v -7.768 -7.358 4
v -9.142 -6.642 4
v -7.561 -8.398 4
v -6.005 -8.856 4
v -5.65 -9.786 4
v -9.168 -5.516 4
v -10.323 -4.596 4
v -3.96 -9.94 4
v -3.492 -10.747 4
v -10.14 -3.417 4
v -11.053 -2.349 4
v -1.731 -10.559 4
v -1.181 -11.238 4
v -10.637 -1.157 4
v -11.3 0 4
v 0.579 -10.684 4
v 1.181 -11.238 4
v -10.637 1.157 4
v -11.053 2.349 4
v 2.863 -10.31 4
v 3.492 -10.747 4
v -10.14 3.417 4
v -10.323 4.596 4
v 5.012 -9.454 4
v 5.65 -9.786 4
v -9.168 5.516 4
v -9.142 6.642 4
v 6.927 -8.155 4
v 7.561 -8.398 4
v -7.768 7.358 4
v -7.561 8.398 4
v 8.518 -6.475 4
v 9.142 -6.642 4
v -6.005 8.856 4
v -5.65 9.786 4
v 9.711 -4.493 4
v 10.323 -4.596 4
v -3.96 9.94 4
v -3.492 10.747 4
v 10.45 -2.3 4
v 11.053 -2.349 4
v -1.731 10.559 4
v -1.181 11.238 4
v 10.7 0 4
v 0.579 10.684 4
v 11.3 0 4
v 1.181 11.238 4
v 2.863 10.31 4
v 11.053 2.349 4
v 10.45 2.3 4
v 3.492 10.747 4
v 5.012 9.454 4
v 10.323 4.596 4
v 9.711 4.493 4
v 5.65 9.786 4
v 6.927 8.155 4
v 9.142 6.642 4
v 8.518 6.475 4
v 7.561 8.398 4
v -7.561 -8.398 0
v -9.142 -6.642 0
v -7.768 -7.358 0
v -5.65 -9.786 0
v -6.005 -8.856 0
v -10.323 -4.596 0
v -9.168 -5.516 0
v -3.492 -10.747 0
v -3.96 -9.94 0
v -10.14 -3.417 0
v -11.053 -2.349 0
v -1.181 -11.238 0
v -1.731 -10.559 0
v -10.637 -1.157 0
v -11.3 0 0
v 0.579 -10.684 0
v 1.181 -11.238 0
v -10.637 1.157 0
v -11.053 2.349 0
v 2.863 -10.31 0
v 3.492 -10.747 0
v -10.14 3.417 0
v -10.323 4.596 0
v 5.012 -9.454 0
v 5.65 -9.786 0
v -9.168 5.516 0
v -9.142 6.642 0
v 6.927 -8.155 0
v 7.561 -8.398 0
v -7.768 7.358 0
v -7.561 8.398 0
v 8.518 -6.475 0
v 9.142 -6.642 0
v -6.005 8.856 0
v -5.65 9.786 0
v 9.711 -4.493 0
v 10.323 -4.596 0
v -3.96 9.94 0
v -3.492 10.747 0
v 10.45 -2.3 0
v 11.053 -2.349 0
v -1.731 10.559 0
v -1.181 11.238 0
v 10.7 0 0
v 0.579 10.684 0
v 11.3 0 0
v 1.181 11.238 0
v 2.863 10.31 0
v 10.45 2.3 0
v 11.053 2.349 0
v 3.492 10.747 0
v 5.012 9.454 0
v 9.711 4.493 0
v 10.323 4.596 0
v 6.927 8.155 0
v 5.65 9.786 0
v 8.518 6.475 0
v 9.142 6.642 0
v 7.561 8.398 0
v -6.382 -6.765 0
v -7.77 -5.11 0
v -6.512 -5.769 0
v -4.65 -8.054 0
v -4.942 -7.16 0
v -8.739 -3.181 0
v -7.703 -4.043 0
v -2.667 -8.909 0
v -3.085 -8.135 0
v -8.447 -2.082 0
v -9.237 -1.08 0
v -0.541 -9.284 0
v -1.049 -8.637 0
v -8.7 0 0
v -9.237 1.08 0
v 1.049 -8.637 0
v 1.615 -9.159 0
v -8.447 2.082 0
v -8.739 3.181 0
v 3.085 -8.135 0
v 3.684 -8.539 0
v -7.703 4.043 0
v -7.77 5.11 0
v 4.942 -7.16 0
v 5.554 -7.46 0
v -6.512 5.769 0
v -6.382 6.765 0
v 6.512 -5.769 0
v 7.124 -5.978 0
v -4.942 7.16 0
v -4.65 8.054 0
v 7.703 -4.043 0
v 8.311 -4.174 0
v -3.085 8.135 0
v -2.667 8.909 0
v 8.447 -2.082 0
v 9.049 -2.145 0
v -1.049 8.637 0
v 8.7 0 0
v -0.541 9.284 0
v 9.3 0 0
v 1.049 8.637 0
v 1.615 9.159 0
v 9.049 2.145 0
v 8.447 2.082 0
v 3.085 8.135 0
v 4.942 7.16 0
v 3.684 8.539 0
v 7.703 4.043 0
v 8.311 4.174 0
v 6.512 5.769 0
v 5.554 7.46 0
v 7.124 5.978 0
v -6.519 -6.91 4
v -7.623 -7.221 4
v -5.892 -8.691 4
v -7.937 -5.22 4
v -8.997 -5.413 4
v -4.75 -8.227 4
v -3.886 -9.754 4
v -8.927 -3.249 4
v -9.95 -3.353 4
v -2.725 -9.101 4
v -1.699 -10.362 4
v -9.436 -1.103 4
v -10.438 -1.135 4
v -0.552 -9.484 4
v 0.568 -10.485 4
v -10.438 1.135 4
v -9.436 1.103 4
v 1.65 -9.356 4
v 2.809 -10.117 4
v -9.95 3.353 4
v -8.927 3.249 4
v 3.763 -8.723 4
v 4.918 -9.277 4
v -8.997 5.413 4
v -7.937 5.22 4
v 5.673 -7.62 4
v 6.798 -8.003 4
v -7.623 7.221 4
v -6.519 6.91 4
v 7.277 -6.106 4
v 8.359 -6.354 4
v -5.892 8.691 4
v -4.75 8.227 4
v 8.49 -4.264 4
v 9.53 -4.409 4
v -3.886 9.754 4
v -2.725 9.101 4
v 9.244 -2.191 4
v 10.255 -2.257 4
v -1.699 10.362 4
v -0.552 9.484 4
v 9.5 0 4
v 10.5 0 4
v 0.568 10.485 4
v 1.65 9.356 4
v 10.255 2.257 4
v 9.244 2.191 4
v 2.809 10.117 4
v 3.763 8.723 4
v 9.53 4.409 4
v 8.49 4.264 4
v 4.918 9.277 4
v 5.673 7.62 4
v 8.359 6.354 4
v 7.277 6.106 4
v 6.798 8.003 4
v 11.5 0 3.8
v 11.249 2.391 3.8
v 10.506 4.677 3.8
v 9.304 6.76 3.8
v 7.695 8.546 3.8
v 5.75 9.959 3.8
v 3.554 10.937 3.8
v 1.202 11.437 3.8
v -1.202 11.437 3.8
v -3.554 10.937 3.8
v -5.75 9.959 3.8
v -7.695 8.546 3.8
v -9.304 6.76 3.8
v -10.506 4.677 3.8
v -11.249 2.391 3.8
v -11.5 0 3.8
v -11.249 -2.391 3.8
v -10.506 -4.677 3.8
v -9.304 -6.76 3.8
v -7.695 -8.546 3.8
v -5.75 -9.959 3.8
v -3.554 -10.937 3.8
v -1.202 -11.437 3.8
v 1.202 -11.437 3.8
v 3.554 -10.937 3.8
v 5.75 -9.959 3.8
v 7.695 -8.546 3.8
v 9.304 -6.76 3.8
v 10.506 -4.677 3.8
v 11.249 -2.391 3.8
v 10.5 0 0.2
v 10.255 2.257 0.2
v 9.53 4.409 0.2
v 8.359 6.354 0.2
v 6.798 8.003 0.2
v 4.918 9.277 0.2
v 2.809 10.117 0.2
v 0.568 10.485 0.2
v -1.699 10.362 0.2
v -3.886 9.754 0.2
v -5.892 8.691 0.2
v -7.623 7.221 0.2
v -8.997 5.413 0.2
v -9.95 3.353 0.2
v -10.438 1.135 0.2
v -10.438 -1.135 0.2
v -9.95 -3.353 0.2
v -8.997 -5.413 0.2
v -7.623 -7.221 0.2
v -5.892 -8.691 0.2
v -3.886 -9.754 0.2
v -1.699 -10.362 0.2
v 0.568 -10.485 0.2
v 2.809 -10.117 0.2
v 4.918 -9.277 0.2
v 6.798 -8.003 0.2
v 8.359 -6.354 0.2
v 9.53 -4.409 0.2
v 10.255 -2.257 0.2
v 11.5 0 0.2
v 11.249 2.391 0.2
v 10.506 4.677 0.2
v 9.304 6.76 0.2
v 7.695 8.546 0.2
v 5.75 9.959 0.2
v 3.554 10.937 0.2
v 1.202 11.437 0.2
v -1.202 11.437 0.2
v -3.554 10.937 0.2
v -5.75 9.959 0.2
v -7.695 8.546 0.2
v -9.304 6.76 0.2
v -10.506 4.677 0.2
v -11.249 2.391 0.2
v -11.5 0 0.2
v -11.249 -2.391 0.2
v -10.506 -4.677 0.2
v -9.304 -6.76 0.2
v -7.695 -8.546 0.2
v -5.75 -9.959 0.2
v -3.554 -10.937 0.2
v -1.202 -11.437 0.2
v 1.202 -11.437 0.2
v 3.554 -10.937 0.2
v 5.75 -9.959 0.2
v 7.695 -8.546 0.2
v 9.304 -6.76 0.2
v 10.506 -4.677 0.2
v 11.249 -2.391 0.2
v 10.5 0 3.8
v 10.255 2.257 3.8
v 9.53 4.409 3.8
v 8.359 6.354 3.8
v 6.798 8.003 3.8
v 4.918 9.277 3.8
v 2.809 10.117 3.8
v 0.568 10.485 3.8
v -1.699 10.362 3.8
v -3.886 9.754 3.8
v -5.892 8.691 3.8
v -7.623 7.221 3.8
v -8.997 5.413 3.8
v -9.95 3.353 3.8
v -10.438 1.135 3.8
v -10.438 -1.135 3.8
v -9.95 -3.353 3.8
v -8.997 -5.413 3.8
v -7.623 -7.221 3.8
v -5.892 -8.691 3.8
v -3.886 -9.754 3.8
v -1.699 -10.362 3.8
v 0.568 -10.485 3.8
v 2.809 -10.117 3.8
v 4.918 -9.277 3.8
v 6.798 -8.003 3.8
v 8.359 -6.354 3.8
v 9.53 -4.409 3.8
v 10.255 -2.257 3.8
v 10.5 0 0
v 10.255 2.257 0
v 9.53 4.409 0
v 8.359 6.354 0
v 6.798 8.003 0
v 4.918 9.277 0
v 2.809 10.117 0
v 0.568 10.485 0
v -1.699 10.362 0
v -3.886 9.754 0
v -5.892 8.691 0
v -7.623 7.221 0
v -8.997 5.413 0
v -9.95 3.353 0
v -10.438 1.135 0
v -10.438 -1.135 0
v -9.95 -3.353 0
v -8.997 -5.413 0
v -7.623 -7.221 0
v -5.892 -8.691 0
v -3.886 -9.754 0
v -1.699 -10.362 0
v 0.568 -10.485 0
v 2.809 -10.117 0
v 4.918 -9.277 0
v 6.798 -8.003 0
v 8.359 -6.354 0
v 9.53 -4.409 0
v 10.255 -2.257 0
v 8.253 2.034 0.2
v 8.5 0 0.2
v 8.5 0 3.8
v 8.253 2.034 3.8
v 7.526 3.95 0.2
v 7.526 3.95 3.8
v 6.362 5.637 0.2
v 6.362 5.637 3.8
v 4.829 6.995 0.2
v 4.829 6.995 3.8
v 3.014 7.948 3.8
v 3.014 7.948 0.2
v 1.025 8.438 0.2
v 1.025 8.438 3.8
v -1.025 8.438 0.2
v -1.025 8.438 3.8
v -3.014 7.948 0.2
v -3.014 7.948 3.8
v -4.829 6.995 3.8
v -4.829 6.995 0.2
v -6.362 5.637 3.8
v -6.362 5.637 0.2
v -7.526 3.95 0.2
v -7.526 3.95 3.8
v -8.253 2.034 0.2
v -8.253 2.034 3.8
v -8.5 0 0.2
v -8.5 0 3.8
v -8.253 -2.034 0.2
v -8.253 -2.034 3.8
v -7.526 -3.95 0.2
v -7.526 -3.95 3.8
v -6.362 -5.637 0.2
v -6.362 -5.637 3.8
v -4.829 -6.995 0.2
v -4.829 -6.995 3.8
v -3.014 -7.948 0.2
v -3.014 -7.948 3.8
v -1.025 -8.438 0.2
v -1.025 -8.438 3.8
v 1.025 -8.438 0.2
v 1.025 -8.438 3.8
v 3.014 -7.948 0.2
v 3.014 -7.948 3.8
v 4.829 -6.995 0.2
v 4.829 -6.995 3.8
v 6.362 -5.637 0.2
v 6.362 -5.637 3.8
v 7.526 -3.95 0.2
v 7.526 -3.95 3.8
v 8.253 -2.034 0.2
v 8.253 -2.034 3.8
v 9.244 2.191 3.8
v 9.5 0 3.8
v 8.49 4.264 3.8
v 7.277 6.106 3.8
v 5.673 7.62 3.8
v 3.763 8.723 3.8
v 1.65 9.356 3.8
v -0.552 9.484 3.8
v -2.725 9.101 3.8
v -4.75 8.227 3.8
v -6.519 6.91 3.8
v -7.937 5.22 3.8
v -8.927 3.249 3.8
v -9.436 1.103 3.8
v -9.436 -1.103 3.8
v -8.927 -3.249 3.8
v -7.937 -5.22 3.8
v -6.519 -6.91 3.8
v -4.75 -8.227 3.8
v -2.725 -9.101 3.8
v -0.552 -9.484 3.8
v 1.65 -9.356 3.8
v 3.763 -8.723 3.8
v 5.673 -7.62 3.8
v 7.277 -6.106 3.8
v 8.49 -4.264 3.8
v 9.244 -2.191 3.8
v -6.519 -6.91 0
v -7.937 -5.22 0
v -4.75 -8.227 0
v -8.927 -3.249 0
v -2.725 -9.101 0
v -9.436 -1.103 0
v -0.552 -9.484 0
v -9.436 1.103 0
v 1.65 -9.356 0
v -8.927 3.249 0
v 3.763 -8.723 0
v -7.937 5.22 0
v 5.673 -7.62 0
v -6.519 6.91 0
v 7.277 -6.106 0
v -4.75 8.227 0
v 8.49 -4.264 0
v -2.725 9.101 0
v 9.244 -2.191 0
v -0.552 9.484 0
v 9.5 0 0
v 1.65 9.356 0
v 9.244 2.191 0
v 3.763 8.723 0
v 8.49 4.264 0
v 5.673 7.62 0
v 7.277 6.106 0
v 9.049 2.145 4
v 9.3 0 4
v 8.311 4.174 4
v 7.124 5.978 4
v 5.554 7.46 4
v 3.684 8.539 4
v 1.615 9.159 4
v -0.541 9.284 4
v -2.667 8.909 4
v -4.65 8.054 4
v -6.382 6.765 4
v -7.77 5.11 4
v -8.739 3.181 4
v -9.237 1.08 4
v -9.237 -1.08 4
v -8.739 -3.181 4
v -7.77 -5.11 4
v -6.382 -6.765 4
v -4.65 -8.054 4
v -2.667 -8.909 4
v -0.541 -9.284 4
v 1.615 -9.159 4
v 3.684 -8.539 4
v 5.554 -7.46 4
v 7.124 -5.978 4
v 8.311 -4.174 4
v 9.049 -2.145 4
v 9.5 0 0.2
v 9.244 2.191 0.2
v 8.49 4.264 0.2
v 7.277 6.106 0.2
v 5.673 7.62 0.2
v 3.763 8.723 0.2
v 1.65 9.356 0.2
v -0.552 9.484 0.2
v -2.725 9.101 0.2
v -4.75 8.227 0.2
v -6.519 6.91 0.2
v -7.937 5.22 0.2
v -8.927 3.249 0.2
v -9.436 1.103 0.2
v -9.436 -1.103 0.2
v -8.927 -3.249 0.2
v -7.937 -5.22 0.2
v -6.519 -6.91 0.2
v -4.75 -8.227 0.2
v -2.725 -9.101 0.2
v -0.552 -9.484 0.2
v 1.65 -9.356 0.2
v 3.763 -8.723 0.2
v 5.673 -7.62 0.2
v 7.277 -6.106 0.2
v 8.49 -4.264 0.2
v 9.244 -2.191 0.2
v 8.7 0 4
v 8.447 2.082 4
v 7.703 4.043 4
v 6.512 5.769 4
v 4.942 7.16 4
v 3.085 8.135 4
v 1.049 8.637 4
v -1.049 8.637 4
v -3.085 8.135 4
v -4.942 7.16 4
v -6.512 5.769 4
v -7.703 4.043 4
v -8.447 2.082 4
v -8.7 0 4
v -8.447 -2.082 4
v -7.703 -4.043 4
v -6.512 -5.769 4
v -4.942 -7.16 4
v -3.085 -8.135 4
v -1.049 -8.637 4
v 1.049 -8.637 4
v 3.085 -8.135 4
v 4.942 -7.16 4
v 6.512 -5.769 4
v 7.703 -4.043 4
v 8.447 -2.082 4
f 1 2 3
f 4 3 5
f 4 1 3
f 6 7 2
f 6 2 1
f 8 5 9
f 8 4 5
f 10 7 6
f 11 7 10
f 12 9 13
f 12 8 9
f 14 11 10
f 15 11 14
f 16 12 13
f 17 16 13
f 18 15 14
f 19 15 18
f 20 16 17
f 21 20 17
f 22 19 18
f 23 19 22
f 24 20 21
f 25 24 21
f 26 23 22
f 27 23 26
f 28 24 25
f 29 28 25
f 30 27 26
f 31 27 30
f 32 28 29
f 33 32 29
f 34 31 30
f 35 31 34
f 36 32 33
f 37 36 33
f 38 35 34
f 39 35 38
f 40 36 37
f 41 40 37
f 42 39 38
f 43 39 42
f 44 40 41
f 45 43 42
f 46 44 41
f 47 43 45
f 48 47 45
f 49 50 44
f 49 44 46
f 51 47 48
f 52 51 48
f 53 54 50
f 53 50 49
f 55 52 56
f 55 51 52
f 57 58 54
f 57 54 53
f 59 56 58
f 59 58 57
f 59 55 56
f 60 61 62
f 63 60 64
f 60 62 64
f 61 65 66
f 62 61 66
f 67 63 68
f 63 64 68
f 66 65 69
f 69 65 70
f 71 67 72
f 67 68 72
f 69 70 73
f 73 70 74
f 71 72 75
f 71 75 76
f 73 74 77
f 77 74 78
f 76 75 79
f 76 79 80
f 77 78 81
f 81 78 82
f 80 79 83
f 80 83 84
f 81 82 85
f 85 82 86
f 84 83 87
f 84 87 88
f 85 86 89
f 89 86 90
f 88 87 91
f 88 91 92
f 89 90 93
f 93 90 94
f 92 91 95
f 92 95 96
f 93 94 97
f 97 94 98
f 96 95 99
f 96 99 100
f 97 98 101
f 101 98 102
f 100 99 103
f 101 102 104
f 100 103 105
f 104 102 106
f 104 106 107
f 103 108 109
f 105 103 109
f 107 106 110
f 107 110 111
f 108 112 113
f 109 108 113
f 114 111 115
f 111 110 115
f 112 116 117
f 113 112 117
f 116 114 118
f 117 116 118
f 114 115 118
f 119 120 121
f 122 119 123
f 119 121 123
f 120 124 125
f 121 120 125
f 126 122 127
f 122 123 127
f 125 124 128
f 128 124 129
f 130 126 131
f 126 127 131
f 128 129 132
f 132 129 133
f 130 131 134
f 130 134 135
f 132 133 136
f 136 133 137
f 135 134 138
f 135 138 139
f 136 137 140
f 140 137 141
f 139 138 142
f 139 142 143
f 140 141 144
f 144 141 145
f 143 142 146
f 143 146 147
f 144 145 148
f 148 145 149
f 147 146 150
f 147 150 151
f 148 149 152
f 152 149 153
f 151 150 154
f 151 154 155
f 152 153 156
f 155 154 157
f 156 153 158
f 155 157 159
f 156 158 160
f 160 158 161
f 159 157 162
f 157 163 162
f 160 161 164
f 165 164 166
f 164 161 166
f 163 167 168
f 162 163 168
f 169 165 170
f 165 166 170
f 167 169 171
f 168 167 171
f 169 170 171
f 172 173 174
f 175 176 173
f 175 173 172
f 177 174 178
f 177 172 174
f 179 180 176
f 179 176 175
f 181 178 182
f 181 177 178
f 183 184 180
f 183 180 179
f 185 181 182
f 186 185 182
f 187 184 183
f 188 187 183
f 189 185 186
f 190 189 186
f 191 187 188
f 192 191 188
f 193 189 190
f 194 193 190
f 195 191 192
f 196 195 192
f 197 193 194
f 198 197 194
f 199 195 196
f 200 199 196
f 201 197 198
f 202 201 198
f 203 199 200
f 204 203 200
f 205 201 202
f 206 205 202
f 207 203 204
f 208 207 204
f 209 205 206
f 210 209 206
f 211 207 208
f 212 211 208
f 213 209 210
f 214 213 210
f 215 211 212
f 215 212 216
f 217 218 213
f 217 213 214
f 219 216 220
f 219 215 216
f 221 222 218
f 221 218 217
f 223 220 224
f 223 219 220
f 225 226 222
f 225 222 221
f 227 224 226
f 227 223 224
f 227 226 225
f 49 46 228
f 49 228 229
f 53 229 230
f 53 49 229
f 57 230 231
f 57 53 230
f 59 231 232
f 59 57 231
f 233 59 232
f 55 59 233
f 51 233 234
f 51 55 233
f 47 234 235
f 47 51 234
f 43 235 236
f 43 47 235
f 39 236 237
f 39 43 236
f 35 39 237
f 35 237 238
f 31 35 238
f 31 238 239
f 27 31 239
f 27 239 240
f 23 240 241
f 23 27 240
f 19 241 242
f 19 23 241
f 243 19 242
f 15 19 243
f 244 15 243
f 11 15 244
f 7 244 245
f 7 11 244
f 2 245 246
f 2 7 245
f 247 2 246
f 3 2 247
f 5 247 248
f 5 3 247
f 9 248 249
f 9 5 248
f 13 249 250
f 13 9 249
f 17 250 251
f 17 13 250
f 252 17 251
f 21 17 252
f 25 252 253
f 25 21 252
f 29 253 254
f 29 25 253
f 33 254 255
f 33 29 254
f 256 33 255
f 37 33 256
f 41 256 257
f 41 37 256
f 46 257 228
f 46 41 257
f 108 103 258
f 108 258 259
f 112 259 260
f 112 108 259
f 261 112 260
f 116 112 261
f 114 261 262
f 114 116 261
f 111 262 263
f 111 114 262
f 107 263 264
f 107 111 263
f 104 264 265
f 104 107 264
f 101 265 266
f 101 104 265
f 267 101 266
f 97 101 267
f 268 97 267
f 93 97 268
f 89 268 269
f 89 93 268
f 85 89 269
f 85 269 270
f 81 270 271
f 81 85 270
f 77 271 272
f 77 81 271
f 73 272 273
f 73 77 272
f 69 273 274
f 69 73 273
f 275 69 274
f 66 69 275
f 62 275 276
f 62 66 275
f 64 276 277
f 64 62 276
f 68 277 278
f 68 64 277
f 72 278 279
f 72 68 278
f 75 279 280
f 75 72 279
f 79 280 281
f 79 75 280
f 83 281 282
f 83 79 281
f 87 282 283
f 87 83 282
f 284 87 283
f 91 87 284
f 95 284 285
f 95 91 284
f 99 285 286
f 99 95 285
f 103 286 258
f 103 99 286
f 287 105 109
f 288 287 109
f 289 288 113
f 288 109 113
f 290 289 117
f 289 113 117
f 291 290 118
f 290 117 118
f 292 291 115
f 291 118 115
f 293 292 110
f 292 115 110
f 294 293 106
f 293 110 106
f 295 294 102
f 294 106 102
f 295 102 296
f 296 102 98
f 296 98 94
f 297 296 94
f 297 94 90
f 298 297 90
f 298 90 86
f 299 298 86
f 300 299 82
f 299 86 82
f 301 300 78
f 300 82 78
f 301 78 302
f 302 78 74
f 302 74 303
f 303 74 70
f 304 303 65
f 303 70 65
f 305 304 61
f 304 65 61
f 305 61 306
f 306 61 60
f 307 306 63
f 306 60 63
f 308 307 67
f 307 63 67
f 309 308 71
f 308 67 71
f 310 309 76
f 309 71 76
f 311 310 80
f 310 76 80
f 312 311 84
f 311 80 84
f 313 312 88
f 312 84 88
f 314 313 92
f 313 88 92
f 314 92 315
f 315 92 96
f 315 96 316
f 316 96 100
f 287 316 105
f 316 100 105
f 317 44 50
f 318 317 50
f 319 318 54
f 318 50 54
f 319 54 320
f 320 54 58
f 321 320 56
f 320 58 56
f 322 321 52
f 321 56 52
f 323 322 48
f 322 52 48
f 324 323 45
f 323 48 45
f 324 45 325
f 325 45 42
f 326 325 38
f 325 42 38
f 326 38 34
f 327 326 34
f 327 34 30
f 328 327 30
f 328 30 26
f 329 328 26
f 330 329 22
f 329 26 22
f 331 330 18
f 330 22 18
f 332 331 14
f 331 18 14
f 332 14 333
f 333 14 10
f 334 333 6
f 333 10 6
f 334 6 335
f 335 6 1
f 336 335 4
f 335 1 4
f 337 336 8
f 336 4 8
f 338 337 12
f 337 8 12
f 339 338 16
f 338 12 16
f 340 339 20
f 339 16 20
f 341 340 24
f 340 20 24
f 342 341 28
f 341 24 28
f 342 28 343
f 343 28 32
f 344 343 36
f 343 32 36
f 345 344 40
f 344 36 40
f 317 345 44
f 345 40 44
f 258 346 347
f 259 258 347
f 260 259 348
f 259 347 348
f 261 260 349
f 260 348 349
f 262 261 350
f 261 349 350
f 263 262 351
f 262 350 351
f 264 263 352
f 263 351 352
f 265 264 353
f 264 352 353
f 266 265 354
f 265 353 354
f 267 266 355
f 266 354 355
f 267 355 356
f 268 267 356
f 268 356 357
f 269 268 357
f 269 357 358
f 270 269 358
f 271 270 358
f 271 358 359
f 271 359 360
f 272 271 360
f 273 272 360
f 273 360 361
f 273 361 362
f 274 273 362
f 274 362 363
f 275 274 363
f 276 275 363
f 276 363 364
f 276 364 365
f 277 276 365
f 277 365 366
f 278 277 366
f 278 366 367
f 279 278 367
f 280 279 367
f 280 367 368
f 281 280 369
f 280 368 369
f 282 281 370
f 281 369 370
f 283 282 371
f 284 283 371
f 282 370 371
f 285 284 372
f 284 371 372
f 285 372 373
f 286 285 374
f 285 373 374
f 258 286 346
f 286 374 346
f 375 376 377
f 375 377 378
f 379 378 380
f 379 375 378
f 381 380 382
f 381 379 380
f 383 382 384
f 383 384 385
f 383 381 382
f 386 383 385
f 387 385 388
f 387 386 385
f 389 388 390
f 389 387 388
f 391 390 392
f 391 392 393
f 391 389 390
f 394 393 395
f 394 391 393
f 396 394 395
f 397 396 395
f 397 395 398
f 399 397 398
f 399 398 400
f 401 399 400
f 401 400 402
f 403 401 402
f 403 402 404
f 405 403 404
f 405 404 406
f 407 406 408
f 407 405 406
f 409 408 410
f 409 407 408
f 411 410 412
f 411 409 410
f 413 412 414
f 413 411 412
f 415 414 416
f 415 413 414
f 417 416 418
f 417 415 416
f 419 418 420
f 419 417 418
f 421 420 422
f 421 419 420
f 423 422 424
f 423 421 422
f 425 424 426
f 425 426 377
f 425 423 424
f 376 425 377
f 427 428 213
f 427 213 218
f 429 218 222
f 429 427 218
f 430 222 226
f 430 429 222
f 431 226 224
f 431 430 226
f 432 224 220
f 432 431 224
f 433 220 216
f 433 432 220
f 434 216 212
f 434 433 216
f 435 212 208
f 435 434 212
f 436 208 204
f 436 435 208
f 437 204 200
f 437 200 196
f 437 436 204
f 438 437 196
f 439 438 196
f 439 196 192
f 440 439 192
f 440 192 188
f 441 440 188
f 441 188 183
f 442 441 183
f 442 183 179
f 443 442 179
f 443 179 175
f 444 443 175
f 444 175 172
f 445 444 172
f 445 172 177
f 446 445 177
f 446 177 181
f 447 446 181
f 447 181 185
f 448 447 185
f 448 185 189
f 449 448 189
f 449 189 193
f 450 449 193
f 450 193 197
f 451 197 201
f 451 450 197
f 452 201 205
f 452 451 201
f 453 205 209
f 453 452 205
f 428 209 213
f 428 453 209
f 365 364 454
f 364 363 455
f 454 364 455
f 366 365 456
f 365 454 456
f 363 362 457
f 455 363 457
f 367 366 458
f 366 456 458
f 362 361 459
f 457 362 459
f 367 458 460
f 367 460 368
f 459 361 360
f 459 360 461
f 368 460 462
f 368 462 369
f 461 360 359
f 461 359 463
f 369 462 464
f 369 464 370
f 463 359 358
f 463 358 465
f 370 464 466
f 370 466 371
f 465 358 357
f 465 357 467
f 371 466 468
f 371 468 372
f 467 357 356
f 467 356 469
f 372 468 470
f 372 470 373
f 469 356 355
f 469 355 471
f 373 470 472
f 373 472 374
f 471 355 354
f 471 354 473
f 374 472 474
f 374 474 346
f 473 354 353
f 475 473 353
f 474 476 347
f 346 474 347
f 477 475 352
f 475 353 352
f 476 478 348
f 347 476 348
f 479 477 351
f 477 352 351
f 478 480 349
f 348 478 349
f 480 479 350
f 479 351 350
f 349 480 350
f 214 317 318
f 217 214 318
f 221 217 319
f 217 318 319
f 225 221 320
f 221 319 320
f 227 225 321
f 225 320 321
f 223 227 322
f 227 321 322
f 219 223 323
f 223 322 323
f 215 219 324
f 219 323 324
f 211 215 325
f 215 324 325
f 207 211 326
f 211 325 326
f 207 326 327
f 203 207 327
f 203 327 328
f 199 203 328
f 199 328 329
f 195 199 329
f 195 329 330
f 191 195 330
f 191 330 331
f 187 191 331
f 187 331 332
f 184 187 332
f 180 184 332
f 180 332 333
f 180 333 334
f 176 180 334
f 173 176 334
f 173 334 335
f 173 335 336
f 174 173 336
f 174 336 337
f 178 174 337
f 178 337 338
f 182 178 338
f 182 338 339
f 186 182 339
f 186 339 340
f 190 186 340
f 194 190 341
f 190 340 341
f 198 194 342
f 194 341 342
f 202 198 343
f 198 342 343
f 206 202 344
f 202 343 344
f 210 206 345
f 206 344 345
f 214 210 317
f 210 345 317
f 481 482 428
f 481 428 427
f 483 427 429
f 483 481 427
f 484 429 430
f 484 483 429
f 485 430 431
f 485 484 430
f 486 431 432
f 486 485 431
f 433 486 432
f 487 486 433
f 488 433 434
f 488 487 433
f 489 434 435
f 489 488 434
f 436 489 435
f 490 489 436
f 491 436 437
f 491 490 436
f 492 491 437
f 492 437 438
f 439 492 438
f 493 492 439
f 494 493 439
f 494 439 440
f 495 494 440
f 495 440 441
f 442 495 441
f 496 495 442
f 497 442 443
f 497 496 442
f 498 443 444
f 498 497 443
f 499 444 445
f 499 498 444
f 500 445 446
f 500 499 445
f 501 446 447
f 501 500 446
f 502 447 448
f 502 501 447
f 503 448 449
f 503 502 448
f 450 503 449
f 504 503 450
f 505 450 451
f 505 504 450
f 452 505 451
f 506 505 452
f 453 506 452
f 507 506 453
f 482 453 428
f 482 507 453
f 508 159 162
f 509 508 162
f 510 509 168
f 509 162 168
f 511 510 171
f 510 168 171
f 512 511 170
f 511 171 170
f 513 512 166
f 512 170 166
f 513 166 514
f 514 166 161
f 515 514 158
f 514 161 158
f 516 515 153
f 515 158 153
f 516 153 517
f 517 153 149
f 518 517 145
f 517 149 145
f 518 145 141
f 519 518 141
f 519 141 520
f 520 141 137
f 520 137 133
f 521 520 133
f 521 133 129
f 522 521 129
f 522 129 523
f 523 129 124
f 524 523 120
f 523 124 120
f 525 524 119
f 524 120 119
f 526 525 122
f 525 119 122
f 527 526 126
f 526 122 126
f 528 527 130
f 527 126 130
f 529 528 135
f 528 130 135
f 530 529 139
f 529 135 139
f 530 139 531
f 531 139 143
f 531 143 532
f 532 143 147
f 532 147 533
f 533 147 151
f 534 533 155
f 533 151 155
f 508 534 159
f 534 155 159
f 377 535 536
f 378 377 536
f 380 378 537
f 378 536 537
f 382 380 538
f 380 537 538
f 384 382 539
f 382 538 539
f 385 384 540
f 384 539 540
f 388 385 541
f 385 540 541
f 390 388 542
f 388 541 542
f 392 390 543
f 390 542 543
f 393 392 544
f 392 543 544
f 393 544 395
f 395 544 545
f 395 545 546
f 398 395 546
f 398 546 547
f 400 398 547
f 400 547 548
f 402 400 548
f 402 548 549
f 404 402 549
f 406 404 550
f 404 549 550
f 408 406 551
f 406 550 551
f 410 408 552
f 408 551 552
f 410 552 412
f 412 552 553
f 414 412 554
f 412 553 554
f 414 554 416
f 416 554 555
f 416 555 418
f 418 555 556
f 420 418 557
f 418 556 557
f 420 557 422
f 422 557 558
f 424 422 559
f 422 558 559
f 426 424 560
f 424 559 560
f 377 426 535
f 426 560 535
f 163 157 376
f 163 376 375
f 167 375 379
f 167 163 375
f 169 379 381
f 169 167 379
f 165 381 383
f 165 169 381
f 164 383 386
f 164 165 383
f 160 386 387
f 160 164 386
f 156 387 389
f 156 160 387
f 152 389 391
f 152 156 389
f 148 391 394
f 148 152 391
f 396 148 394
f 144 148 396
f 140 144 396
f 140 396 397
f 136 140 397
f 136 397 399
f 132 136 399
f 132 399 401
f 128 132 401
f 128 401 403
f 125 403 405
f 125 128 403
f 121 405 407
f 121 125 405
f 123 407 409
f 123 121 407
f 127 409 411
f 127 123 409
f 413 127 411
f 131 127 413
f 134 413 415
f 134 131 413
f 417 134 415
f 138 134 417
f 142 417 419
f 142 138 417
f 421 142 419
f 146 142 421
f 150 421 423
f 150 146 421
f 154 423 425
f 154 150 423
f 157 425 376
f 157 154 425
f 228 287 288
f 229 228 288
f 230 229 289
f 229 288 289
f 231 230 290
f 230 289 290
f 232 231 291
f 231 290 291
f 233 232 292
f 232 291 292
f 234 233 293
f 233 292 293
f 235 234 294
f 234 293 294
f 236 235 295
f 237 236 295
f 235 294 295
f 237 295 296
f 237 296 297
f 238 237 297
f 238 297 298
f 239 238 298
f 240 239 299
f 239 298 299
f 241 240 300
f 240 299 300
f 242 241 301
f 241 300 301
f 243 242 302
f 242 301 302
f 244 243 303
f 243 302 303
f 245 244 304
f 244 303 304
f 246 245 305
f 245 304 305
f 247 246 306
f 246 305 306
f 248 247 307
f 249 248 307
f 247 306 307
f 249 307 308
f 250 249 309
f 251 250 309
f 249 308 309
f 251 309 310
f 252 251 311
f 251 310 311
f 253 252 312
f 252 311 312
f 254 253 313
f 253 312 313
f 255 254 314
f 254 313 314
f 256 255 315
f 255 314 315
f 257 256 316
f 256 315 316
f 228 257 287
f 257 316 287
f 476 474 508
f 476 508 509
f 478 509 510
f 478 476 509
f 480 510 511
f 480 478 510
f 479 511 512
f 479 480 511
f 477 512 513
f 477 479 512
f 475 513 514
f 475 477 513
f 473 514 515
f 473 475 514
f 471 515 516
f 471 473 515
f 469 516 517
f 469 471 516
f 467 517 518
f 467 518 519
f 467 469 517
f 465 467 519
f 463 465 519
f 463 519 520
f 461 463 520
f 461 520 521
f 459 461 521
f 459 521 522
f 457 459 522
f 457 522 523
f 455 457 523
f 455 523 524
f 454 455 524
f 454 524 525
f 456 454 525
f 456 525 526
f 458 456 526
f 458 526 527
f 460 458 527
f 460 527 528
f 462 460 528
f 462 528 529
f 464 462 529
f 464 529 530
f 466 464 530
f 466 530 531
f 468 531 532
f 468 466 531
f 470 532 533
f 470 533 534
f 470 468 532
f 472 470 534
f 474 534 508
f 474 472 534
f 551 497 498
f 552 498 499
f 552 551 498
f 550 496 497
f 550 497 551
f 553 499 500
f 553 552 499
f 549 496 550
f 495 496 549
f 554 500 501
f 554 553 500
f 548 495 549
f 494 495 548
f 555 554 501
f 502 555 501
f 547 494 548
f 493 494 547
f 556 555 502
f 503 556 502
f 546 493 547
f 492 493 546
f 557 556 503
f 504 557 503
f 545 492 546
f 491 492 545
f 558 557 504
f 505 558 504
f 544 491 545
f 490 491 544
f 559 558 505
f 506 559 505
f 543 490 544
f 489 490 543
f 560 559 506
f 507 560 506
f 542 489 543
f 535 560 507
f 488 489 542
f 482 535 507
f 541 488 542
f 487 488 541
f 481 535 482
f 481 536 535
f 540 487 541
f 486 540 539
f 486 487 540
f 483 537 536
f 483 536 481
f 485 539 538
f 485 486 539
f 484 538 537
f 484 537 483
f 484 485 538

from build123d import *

# Parameters (mm, degrees)
SKETCH1_R             = 11.5
SKETCH1_R_2           = 10.5
BOSS_EXTRUDE1_DEPTH   = 4
SKETCH1_R_3           = 9.5
SKETCH1_R_4           = 8.5
BOSS_EXTRUDE1_2_DEPTH = 4
CHAMFER1_SIZE         = 0.2
CHAMFER2_SIZE         = 0.2
SKETCH1_3_R           = 10.5
SKETCH1_3_R_2         = 9.5
BOSS_EXTRUDE2_DEPTH   = 4


with BuildPart() as part:
    # Sketch1 → Boss-Extrude1 (new body)
    with BuildSketch(Plane.XY):
        Circle(SKETCH1_R)
        Circle(SKETCH1_R_2, mode=Mode.SUBTRACT)
    extrude(amount=BOSS_EXTRUDE1_DEPTH)

    # Chamfer1
    chamfer1_edges = [part.edges().sort_by_distance(p)[0] for p in [
        (-11.5, 0, 0),
        (-10.5, 0, 0),
        (-10.5, 0, 4),
        (-11.5, 0, 4),
    ]]
    chamfer(chamfer1_edges, length=CHAMFER1_SIZE)



with BuildPart() as body_2:
    # Sketch1 → Boss-Extrude1 2 (new body)
    with BuildSketch(Plane.XY):
        Circle(SKETCH1_R_3)
        Circle(SKETCH1_R_4, mode=Mode.SUBTRACT)
    extrude(amount=BOSS_EXTRUDE1_2_DEPTH)

    # Chamfer2
    chamfer2_edges = [body_2.edges().sort_by_distance(p)[0] for p in [
        (-9.5, 0, 0),
        (-8.5, 0, 0),
        (-8.5, 0, 4),
        (-9.5, 0, 4),
    ]]
    chamfer(chamfer2_edges, length=CHAMFER2_SIZE)


with BuildPart() as part_1:
    add(part.part)

    add(body_2.part)  # Boss-Extrude2 merges body 2
    # Sketch1<3> → Boss-Extrude2 (add)
    with BuildSketch(Plane.XY):
        Circle(SKETCH1_3_R)
        Circle(SKETCH1_3_R_2, mode=Mode.SUBTRACT)
    extrude(amount=BOSS_EXTRUDE2_DEPTH)


solid = part_1.part
